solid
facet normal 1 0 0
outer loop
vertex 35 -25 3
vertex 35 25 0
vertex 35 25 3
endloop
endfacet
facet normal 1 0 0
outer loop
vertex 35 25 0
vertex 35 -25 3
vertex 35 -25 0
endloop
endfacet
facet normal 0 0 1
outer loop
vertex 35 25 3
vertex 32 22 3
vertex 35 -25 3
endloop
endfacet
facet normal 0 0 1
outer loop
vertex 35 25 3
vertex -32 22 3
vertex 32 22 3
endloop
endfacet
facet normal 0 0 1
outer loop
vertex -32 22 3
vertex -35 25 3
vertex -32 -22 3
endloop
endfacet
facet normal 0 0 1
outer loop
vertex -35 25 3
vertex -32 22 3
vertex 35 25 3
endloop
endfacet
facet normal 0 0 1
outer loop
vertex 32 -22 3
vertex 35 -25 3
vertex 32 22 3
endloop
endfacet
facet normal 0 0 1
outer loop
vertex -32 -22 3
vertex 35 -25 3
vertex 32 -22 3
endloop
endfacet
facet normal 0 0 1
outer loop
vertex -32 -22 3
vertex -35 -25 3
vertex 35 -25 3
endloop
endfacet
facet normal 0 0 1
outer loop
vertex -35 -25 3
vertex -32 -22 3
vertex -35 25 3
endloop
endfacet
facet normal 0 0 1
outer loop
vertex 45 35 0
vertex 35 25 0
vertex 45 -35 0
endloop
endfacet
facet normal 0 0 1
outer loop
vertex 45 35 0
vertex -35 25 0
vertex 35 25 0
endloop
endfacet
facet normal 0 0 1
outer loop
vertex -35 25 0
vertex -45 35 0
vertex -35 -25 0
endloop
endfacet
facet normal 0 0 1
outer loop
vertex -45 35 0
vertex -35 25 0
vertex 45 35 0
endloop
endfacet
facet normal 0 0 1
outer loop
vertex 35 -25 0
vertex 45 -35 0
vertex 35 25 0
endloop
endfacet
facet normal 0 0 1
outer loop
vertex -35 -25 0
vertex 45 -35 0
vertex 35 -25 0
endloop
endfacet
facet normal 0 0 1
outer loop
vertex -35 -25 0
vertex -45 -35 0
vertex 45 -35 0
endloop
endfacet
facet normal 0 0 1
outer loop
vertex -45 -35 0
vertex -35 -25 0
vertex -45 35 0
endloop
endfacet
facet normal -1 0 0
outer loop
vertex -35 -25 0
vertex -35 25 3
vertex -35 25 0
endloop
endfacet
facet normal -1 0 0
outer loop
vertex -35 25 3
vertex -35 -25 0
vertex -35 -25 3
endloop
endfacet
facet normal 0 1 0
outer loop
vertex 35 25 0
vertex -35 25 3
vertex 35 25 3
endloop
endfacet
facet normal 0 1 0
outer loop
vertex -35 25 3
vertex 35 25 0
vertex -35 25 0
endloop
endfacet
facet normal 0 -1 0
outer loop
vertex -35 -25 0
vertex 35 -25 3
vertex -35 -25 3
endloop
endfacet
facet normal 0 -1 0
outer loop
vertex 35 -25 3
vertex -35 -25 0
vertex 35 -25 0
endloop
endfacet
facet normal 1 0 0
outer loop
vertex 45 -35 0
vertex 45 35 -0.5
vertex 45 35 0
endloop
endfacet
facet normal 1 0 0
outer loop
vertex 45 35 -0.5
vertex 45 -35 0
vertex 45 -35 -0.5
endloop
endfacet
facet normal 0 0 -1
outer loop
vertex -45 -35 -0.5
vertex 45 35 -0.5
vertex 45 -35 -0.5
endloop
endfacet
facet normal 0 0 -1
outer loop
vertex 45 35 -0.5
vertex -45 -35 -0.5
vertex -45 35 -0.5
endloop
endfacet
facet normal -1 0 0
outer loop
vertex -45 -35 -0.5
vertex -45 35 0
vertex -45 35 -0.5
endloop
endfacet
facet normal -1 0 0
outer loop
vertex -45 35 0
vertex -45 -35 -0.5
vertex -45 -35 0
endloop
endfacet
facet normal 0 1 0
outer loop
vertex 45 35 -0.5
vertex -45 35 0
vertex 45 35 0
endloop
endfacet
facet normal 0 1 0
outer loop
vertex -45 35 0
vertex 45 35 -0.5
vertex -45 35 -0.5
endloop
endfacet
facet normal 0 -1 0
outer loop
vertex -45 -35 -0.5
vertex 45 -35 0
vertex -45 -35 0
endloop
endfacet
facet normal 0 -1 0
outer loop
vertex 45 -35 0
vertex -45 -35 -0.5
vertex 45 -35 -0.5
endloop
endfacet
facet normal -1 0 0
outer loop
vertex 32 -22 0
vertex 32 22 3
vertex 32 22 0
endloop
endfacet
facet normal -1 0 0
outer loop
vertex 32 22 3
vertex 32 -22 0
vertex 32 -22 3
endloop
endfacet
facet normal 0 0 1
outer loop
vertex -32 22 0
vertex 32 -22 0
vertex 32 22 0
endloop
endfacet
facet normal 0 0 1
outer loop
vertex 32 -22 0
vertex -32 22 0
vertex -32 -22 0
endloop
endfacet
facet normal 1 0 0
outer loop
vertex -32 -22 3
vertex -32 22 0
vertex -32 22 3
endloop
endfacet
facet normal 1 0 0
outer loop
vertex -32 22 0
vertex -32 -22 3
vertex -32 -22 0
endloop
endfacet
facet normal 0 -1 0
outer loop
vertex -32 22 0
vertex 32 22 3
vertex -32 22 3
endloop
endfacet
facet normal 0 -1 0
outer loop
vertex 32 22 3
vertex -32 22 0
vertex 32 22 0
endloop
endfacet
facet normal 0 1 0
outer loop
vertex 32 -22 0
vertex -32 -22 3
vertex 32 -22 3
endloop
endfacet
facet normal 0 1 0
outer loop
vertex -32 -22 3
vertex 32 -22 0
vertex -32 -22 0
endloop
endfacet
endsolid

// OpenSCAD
module slip_frame(width, height, depth, thickness_wall, thickness_skirt, depth_skirt) {
    difference() {
        union(){
            translate([-width/2, -height/2, 0]) {
                cube([width, height, thickness_wall]); // Create outer frame
            }
            translate([-width/2 - thickness_skirt, -height/2 - thickness_skirt, -depth_skirt]) {
                cube([width + 2 * thickness_skirt, height + 2 * thickness_skirt, depth_skirt]); // Create skirt
            }
    }
        translate([-width/2 + thickness_wall, -height/2 + thickness_wall, 0]) {
            cube([width - 2 * thickness_wall, height - 2 * thickness_wall, depth]); // Create inner hole
        }

        
    }
}

// Example usage:
width = 70;
height = 50;
depth = 30;
thickness_wall = 3;
thickness_skirt = 10;
depth_skirt = 0.5;

slip_frame(width, height, depth, thickness_wall, thickness_skirt, depth_skirt);
